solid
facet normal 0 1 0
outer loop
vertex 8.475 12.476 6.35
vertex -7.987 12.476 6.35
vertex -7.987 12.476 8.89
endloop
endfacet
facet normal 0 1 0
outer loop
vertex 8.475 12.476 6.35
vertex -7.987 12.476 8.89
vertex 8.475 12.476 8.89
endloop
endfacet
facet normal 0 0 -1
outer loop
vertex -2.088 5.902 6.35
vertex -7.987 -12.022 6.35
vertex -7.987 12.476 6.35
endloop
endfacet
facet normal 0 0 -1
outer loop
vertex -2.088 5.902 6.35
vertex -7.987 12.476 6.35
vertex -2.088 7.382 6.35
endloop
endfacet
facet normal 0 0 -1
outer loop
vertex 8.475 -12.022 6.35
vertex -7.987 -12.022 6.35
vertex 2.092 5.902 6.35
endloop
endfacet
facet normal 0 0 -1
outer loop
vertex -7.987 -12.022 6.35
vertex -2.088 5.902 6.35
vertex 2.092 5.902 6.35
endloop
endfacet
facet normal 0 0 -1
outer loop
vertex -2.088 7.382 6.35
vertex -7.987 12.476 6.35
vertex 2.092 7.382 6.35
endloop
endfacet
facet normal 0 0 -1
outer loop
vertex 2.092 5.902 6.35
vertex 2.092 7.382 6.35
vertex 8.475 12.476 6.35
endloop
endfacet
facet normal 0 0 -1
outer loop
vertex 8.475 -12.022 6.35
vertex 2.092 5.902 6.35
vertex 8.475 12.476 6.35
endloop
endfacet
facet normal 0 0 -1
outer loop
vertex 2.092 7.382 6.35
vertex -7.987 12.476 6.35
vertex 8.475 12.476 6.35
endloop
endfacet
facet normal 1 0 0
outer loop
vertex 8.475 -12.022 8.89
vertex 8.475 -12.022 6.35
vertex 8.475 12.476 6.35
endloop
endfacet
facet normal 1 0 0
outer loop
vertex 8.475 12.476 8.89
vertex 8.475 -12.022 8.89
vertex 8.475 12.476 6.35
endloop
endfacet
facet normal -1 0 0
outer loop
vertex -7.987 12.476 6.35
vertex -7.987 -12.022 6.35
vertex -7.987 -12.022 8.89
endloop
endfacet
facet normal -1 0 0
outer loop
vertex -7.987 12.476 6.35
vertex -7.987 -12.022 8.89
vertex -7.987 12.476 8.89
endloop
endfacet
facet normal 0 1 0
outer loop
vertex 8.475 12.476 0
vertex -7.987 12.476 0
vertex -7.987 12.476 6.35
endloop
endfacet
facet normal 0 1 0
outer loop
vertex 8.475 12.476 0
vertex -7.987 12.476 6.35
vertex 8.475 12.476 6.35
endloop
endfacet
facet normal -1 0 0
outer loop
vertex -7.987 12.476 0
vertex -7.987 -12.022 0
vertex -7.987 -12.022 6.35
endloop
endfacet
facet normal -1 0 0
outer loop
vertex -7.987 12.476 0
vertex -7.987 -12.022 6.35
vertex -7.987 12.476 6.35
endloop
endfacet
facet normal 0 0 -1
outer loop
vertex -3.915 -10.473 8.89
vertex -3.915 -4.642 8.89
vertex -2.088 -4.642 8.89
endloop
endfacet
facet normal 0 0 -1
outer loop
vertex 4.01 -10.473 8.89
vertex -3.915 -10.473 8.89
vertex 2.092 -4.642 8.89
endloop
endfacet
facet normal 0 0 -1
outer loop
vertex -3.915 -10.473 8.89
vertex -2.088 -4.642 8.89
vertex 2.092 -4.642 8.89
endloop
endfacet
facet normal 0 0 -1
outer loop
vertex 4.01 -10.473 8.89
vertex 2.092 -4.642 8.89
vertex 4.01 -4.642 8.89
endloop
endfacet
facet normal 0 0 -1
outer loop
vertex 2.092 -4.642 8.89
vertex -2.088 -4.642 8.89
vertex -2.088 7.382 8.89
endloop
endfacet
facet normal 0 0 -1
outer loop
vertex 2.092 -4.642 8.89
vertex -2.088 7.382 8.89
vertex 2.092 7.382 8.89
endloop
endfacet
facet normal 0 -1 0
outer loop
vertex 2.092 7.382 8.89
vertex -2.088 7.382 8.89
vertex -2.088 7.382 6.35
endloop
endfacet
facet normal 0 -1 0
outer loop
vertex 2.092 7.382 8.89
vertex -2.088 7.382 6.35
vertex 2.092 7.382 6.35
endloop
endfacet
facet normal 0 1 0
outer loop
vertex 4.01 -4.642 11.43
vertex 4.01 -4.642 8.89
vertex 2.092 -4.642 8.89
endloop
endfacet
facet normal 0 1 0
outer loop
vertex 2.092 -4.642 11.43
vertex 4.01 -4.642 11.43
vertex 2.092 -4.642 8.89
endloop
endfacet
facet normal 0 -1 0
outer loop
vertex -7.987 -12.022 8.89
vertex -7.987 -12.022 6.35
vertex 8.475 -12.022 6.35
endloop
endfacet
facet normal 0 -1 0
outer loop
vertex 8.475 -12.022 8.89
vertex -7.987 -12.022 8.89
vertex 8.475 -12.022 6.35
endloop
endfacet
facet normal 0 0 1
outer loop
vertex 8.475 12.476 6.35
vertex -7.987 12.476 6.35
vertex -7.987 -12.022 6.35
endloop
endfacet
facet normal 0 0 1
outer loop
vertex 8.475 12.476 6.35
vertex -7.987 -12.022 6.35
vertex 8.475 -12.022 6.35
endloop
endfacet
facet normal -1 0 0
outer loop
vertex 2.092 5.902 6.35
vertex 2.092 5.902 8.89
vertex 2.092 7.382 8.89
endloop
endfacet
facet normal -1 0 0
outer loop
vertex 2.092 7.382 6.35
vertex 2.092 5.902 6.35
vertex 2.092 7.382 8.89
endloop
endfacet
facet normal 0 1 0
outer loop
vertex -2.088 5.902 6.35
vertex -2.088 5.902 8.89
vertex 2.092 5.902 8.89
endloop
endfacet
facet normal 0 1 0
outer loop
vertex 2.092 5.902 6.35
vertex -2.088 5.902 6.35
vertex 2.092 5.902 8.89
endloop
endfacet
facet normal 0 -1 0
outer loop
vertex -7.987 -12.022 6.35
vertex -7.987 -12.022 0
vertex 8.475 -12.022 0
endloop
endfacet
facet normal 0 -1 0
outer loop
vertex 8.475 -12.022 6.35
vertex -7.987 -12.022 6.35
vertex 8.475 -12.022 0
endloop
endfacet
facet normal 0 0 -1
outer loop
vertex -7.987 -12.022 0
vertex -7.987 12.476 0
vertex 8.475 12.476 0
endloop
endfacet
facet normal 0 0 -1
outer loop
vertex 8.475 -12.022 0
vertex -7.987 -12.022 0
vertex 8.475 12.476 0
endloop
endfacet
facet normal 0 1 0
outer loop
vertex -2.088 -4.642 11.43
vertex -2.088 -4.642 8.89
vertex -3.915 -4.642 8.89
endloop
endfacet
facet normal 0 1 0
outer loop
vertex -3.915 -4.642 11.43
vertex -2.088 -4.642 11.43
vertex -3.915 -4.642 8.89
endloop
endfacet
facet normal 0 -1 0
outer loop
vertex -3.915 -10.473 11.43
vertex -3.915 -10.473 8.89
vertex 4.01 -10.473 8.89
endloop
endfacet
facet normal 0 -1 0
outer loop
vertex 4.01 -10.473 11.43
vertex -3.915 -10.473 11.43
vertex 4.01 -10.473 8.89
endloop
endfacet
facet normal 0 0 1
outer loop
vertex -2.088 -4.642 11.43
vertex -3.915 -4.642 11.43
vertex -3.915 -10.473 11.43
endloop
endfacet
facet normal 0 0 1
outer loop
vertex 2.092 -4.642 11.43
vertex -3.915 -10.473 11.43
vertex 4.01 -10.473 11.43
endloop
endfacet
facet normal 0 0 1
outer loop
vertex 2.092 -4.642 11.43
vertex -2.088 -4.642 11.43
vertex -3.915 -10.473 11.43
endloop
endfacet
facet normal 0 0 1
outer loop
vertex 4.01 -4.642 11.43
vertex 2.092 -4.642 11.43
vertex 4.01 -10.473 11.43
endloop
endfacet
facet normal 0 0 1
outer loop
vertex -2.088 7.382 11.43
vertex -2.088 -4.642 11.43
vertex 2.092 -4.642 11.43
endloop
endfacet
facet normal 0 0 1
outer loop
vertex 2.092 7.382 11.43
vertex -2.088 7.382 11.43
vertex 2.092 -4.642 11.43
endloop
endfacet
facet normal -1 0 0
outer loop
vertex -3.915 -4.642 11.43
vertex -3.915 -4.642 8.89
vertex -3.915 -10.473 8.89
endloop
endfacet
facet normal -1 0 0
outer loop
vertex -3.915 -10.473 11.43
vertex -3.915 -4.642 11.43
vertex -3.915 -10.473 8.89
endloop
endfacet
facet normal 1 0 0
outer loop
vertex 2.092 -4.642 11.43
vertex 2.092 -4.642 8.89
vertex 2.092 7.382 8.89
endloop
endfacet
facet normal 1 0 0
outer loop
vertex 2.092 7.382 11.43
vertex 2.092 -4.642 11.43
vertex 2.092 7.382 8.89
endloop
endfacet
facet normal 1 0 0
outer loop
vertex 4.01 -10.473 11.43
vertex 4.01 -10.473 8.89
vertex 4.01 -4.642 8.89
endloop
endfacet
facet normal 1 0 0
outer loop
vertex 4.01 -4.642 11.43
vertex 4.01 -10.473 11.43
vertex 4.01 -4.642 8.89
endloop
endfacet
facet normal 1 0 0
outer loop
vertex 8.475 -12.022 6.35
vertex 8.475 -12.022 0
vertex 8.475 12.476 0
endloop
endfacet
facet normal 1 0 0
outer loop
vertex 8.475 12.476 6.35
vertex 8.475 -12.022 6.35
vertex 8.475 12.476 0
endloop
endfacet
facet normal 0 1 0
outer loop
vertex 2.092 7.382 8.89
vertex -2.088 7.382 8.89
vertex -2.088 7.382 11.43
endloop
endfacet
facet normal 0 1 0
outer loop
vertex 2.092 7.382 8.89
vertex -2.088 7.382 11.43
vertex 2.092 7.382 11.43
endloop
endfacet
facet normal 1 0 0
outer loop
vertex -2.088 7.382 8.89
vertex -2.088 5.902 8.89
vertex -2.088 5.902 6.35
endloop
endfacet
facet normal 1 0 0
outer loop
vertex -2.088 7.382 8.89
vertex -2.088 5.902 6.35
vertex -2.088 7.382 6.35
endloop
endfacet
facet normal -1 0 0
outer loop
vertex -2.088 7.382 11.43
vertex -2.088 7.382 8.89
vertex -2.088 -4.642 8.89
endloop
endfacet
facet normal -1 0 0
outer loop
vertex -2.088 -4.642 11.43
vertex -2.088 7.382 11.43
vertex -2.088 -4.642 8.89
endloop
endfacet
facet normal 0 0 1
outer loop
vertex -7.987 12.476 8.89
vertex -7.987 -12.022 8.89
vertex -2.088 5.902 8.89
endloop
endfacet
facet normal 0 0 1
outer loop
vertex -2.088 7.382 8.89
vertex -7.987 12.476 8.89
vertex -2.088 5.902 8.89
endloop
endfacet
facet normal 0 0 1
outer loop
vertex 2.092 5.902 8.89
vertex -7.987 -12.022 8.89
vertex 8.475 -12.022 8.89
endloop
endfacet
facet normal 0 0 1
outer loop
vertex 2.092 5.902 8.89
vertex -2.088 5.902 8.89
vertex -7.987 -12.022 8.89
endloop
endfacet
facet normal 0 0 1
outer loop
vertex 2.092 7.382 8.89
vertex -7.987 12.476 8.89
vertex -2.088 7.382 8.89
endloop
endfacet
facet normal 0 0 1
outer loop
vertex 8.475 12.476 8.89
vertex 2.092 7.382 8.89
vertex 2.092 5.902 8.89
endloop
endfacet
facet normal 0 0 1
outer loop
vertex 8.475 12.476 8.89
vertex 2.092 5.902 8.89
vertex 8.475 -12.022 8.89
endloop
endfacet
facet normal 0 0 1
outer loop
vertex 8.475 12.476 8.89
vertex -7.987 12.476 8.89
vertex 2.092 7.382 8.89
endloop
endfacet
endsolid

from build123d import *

# Parameters (mm, degrees)
F0_W     = 16.462284606
F0_H     = 24.4974466041
F1_DEPTH = 6.35
F2_W     = 16.462284606
F2_H     = 24.4974466041
F3_DEPTH = 2.54
F4_W     = 4.1798030725
F4_H     = 1.4798403718
F5_DEPTH = 2.54
F6_W     = 4.1798030725
F6_H     = 12.0247541927
F6_H_2   = 5.8034774847
F7_DEPTH = 2.54


# Not quite as in the source:
# - a feature names something its author has since deleted; it is built from what else it names


with BuildPart() as f1:
    # F0 (on Top) → F1 (new body)
    with BuildSketch(Plane.XY):
        with Locations((0.2442786936, 0.227171462)):
            Rectangle(F0_W, F0_H)
    extrude(amount=F1_DEPTH)


with BuildPart() as f3:
    # F2 (on face) → F3 (new body)
    with BuildSketch(Plane.XY.offset(6.35)):
        with Locations((0.2442786936, 0.227171462)):
            Rectangle(F2_W, F2_H)
    extrude(amount=F3_DEPTH)

    # F4 (on face) → F5 (cut)
    with BuildSketch(Plane.XY.offset(8.89)):
        with Locations((0.0016469858, 6.6424182151)):
            Rectangle(F4_W, F4_H)
    extrude(amount=-F5_DEPTH, mode=Mode.SUBTRACT)


with BuildPart() as f7:
    # F6 (on face) → F7 (new body)
    with BuildSketch(Plane.XY.offset(8.89)):
        with Locations((0.0016469858, 1.3699613046)):
            Rectangle(F6_W, F6_H)
        with Locations((0.0016469858, -7.5441545341)):
            Rectangle(F6_W, F6_H_2)
        Polygon((-2.0882545505, -10.4458932765), (-2.0882545505, -4.6424157917), (-3.9152200043, -4.6424157917), (-3.9152200043, -10.4728732258), (4.009673401, -10.4728732258), (4.009673401, -4.6424157917), (2.091548522, -4.6424157917), (2.091548522, -10.4458932765), align=None)
    extrude(amount=F7_DEPTH)


solid = Compound([f1.part, f3.part, f7.part])
